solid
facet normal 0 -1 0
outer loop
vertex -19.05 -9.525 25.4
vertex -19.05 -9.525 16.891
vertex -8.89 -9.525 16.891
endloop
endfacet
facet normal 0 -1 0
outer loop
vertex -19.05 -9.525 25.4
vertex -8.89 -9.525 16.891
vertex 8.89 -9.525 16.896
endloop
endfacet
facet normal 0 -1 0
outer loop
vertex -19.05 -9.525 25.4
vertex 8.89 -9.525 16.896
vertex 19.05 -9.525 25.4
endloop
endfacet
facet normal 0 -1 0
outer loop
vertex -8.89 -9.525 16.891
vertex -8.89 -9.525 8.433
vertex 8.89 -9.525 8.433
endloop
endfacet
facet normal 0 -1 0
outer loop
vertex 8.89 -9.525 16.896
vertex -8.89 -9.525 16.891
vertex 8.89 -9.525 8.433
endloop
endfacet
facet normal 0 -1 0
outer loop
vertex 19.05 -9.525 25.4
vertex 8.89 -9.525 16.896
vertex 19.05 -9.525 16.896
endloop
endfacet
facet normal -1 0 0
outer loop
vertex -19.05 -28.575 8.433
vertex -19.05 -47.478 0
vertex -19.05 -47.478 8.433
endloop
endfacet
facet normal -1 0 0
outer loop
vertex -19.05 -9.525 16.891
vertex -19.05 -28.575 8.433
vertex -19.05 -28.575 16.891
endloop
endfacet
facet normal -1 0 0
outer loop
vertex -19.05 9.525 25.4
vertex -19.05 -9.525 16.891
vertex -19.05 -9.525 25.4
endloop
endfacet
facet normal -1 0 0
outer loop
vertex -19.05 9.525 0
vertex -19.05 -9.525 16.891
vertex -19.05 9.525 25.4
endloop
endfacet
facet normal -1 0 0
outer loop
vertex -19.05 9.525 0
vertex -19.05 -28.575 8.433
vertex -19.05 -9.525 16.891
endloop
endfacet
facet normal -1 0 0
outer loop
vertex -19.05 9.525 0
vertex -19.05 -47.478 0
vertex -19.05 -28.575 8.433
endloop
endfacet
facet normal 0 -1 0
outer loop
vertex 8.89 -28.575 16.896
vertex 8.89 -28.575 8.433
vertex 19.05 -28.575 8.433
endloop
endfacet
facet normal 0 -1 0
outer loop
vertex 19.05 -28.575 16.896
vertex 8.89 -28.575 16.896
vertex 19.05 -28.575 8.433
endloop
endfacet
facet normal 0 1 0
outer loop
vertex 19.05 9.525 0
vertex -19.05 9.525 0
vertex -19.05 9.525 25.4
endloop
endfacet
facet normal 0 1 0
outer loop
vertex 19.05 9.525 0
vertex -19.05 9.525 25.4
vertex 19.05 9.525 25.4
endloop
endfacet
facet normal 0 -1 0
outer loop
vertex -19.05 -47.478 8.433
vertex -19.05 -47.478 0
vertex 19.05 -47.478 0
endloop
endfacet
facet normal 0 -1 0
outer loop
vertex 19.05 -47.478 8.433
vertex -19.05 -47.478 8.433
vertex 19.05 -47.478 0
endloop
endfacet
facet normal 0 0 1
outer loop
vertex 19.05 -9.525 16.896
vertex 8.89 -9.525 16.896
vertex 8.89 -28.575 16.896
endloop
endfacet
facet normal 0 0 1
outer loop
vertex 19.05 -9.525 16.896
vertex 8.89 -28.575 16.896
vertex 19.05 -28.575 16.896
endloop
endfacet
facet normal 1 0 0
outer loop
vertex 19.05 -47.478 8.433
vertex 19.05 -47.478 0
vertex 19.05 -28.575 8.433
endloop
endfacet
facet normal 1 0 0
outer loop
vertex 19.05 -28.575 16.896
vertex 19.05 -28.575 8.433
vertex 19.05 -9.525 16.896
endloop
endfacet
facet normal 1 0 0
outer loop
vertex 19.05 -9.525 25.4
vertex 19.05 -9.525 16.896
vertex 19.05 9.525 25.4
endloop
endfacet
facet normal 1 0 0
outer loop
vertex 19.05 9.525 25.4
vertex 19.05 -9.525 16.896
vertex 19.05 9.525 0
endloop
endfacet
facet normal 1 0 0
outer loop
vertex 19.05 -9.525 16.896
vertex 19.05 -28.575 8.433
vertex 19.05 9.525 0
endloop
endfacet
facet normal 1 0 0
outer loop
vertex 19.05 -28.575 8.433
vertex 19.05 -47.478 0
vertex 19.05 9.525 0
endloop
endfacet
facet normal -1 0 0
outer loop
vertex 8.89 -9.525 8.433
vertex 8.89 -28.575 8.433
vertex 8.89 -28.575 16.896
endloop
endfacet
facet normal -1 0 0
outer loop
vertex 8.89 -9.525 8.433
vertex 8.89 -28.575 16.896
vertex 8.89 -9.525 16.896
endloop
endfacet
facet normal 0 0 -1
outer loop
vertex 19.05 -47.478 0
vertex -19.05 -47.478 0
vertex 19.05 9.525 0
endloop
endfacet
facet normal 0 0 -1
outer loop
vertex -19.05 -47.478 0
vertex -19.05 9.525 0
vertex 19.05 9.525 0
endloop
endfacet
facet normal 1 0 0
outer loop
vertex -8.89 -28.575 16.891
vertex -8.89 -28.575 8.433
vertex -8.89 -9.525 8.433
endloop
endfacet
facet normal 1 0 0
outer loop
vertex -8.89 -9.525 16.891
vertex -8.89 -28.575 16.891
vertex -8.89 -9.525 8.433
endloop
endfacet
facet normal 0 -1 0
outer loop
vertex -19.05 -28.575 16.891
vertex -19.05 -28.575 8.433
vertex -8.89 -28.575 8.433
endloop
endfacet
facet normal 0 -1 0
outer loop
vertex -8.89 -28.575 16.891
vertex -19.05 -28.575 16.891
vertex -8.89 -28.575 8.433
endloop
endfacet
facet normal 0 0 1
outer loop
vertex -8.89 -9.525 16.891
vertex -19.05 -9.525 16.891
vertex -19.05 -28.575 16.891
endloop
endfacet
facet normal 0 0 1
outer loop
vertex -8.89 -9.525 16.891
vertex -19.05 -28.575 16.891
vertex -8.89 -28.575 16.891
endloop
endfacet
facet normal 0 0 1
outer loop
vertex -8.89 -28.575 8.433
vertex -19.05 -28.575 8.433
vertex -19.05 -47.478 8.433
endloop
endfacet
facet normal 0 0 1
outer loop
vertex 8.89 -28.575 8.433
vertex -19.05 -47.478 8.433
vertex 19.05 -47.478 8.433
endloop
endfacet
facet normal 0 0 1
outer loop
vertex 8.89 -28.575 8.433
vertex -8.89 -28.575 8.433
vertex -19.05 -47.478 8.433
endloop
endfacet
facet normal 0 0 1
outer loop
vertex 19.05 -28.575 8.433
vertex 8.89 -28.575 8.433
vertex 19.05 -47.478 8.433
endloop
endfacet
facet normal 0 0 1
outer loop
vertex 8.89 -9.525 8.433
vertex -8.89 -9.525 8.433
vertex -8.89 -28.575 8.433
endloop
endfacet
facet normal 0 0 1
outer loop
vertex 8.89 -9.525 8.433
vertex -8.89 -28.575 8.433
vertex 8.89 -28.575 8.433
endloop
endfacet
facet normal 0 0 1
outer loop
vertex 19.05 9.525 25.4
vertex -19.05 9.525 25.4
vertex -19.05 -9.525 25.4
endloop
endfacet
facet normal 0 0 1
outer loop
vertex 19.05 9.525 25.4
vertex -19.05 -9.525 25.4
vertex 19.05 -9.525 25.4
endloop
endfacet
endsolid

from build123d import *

# Parameters (mm, degrees)
F0_W     = 38.1
F0_H     = 19.05
F1_DEPTH = 25.4
F2_W     = 38.1
F2_H     = 38.1
F3_DEPTH = 8.4328
F4_W     = 10.16
F4_H     = 19.05
F5_DEPTH = 8.4582
F6_DEPTH = 8.46328


with BuildPart() as f1:
    # F0 (on Top) → F1 (new body)
    with BuildSketch(Plane.XY):
        Rectangle(F0_W, F0_H)
    extrude(amount=F1_DEPTH)

    # F2 (on Top) → F3 (join)
    with BuildSketch(Plane.XY):
        with Locations((0, -28.427749)):
            Rectangle(F2_W, F2_H)
    extrude(amount=F3_DEPTH)

    # F4 (on face) → F5 (join)
    with BuildSketch(Plane.XY.offset(8.4328)):
        with Locations((-13.97, -19.05)):
            Rectangle(F4_W, F4_H)
    extrude(amount=F5_DEPTH)

    # F4 (on face) → F6 (join)
    with BuildSketch(Plane.XY.offset(8.4328)):
        with Locations((13.97, -19.05)):
            Rectangle(F4_W, F4_H)
    extrude(amount=F6_DEPTH)


solid = f1.part
